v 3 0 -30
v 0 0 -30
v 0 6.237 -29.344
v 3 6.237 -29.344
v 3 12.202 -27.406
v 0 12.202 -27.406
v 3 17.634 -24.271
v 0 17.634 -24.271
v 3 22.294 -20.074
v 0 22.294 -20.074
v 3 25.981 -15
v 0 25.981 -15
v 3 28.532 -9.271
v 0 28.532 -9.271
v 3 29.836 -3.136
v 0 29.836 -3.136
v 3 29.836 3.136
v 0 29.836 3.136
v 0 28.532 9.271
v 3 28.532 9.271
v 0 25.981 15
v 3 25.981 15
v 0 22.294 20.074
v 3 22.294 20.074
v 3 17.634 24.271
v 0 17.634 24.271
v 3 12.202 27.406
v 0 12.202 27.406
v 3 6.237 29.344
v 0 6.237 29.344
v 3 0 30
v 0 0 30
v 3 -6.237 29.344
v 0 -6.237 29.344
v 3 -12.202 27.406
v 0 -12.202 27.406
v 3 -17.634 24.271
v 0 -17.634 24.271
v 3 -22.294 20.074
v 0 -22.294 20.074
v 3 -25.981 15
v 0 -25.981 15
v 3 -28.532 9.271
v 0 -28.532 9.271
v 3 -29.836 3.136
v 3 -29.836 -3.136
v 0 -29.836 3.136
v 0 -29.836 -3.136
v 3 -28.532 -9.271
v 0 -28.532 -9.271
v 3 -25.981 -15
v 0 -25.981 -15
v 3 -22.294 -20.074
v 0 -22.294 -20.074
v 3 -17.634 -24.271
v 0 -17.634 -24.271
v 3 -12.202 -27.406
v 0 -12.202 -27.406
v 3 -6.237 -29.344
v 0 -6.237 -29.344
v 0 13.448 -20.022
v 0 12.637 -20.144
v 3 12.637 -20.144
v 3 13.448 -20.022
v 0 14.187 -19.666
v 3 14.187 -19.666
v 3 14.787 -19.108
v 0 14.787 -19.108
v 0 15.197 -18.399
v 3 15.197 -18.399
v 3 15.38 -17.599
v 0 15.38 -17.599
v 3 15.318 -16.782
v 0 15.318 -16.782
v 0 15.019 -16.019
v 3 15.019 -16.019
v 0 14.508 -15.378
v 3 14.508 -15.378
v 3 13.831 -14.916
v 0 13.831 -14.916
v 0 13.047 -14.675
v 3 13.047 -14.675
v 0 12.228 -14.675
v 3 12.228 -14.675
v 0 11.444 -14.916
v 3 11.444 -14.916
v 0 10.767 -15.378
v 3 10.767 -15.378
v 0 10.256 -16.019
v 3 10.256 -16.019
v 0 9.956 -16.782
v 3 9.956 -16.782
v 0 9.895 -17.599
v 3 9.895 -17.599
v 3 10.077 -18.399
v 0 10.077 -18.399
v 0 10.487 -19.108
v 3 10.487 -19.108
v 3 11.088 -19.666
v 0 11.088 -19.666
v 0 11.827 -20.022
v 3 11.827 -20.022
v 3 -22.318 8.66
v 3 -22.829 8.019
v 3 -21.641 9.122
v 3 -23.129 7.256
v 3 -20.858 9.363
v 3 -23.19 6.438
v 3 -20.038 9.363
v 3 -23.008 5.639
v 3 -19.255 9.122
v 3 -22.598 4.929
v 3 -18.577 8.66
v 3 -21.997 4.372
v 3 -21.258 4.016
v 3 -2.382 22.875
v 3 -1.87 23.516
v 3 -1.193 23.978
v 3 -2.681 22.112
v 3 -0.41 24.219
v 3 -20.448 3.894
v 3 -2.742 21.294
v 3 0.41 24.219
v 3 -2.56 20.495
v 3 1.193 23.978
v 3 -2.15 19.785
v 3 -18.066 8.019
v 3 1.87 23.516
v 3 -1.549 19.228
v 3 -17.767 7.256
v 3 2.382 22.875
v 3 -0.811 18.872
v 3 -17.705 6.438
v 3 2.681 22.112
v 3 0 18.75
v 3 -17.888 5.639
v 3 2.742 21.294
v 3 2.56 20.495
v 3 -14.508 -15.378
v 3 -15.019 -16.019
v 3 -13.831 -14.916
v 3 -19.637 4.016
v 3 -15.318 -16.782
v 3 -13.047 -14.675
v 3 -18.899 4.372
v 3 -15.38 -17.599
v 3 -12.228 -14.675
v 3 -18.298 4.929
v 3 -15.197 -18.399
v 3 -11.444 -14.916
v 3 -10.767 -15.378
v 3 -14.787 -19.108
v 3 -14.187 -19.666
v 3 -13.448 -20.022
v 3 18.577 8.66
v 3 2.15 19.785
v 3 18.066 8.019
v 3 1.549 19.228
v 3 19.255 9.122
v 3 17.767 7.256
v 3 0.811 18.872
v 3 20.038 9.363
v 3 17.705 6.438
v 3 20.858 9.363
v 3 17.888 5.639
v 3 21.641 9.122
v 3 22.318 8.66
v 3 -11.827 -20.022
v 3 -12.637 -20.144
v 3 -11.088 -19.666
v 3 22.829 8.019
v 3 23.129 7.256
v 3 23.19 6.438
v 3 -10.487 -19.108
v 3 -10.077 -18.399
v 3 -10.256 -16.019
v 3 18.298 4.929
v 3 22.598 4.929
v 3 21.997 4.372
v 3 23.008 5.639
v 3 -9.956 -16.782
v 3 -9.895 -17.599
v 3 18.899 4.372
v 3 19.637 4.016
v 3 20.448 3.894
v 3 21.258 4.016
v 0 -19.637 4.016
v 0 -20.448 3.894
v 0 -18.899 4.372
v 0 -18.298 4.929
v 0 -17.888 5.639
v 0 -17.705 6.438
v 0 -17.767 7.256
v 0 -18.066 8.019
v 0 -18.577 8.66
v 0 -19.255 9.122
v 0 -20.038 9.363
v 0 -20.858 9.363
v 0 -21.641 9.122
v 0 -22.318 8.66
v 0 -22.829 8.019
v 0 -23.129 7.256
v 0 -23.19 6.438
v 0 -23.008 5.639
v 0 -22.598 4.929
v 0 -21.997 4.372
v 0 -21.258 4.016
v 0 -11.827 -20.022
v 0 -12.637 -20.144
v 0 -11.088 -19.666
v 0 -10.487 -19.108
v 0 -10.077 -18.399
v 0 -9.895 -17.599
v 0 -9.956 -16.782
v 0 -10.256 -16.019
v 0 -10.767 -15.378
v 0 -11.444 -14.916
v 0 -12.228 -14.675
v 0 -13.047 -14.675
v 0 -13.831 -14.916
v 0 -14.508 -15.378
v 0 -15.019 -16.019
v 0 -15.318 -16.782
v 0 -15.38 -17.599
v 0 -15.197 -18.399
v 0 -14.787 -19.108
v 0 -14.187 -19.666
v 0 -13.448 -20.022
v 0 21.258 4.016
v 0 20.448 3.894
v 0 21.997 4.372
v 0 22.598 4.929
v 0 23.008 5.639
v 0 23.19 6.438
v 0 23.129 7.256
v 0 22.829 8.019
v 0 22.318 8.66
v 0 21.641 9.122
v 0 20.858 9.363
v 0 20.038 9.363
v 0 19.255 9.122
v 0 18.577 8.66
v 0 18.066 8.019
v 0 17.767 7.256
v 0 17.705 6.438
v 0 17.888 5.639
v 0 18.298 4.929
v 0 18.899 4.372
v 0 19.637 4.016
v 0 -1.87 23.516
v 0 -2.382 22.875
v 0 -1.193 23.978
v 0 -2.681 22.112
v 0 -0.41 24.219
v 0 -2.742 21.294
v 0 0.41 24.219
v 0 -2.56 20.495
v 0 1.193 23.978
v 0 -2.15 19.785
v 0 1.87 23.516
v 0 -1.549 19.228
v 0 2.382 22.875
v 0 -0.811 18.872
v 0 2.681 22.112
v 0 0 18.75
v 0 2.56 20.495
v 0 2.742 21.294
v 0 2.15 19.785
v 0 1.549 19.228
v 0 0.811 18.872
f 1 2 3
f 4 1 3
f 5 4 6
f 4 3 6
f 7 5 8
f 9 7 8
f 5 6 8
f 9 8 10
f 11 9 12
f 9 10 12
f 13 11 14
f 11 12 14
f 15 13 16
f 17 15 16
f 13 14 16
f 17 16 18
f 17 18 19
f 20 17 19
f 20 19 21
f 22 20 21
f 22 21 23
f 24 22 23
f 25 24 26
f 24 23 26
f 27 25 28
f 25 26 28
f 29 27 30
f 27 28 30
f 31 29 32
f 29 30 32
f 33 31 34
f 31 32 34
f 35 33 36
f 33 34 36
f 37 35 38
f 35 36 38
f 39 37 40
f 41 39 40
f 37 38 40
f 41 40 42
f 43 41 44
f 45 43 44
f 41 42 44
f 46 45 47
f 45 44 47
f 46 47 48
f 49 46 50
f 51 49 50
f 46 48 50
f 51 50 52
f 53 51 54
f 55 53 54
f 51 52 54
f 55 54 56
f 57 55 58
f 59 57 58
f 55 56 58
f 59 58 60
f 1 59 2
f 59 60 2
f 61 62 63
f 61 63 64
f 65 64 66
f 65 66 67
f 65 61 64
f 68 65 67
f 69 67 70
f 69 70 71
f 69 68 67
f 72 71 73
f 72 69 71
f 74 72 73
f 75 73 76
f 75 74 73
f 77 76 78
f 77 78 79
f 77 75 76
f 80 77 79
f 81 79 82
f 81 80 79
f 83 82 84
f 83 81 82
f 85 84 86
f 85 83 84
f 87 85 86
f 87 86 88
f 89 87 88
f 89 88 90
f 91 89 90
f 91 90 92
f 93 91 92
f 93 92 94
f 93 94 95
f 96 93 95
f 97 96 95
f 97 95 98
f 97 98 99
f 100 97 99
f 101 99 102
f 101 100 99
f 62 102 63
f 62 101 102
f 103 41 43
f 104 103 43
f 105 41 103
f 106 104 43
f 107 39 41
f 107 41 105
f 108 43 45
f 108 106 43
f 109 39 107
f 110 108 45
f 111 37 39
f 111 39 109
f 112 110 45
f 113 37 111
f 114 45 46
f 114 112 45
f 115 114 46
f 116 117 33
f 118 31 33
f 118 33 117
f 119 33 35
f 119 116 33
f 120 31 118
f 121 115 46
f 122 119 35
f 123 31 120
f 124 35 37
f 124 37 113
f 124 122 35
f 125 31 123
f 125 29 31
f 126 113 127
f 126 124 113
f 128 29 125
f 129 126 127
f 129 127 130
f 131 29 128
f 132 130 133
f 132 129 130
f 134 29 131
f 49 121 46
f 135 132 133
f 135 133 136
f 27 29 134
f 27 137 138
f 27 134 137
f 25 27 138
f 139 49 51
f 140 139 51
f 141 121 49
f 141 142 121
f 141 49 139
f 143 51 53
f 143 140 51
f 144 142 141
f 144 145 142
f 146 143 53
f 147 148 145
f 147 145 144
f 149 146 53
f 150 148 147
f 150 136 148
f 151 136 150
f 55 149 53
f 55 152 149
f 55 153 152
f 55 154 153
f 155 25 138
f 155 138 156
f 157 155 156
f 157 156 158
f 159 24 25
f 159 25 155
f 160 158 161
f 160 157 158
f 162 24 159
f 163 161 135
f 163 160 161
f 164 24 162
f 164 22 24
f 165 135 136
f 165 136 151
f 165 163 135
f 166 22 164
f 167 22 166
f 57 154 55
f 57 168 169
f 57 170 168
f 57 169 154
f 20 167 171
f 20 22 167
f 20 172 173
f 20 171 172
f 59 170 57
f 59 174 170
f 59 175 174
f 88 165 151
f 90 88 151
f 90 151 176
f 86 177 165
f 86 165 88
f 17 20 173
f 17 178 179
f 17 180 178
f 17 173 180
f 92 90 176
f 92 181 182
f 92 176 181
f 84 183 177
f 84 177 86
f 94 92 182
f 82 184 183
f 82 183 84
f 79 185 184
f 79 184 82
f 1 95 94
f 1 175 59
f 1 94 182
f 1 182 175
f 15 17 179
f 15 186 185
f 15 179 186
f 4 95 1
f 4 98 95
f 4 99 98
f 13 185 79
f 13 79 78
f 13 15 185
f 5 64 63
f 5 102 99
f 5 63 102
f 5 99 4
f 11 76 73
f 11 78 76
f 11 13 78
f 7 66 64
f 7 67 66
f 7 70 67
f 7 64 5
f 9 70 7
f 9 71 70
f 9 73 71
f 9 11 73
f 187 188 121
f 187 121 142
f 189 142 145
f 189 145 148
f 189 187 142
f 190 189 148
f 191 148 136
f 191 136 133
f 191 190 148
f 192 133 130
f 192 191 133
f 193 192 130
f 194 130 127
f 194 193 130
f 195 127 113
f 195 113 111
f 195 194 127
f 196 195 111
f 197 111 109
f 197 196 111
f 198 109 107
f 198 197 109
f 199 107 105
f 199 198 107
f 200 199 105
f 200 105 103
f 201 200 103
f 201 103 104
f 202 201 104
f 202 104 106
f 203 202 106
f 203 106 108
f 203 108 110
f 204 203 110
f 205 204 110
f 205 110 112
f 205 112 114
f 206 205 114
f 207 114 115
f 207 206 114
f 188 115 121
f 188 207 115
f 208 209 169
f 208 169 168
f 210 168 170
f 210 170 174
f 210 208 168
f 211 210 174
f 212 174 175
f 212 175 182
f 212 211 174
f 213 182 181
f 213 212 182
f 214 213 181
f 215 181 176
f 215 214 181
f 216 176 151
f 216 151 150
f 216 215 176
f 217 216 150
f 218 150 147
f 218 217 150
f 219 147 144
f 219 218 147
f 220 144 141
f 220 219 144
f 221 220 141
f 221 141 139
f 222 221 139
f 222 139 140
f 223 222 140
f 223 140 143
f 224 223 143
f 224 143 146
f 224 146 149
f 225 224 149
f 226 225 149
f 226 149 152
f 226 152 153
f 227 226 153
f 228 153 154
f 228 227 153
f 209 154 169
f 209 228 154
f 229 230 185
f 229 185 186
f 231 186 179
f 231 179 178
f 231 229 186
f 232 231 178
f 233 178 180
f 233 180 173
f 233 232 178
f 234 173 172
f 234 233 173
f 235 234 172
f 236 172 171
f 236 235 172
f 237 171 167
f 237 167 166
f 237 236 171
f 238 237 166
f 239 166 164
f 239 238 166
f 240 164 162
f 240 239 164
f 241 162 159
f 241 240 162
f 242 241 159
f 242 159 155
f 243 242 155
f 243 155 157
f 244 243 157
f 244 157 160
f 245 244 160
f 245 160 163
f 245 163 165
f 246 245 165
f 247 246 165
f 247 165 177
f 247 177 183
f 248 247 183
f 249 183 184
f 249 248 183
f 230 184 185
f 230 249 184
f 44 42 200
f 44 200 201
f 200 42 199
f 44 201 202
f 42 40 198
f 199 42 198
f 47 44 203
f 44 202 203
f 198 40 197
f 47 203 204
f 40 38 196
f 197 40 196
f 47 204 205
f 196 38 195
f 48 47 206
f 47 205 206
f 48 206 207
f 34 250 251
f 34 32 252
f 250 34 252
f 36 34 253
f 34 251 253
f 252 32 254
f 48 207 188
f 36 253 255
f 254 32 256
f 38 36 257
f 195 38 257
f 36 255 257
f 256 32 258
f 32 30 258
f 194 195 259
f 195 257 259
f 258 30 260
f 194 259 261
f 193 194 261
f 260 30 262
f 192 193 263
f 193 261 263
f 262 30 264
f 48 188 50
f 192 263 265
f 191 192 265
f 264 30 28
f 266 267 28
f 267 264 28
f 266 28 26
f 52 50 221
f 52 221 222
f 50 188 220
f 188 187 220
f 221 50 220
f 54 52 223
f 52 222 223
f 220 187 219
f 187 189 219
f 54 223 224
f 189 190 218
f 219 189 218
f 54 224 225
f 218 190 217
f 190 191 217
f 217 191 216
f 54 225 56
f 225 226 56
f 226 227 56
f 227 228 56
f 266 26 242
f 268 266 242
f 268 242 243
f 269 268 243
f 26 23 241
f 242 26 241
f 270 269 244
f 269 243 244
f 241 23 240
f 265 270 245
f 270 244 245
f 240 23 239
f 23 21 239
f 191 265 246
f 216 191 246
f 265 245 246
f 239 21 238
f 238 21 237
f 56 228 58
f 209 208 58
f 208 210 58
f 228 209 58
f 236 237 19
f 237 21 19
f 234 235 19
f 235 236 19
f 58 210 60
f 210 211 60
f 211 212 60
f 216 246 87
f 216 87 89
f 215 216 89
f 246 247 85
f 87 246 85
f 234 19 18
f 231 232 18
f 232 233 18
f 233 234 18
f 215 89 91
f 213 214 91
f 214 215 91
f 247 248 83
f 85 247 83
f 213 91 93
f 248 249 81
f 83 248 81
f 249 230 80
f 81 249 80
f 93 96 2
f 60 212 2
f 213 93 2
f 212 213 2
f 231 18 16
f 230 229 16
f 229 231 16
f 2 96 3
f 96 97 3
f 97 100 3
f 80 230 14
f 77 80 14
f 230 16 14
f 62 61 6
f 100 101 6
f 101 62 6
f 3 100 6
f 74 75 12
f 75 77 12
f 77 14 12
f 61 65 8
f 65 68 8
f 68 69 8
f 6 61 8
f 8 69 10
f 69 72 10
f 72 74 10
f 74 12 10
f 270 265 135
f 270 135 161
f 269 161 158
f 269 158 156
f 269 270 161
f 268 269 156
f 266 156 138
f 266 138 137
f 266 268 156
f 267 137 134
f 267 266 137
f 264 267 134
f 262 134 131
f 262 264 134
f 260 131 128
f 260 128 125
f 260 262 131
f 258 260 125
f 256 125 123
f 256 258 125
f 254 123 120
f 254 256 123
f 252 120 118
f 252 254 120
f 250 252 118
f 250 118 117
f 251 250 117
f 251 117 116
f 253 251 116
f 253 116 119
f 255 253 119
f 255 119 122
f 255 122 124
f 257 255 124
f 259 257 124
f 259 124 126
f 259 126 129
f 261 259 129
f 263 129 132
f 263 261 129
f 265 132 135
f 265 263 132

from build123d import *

# Parameters (mm, degrees)
SKETCH1_R           = 30
SKETCH1_R_2         = 2.75
BOSS_EXTRUDE1_DEPTH = 3


with BuildPart() as part:
    # Sketch1 → Boss-Extrude1 (new body)
    with BuildSketch(Plane.YZ):
        with Locations(Location((0, 0, 0), (0, 0, 270))):
            Circle(SKETCH1_R)
        with Locations(Location((0, 21.5, 0), (0, 0, 270))):
            Circle(SKETCH1_R_2, mode=Mode.SUBTRACT)
        with Locations(Location((20.4477151, 6.643865379, 0), (0, 0, 270))):
            Circle(SKETCH1_R_2, mode=Mode.SUBTRACT)
        with Locations(Location((12.637382924, -17.393865379, 0), (0, 0, 270))):
            Circle(SKETCH1_R_2, mode=Mode.SUBTRACT)
        with Locations(Location((-12.637382924, -17.393865379, 0), (0, 0, 270))):
            Circle(SKETCH1_R_2, mode=Mode.SUBTRACT)
        with Locations(Location((-20.4477151, 6.643865379, 0), (0, 0, 270))):
            Circle(SKETCH1_R_2, mode=Mode.SUBTRACT)
    extrude(amount=BOSS_EXTRUDE1_DEPTH)


solid = part.part
